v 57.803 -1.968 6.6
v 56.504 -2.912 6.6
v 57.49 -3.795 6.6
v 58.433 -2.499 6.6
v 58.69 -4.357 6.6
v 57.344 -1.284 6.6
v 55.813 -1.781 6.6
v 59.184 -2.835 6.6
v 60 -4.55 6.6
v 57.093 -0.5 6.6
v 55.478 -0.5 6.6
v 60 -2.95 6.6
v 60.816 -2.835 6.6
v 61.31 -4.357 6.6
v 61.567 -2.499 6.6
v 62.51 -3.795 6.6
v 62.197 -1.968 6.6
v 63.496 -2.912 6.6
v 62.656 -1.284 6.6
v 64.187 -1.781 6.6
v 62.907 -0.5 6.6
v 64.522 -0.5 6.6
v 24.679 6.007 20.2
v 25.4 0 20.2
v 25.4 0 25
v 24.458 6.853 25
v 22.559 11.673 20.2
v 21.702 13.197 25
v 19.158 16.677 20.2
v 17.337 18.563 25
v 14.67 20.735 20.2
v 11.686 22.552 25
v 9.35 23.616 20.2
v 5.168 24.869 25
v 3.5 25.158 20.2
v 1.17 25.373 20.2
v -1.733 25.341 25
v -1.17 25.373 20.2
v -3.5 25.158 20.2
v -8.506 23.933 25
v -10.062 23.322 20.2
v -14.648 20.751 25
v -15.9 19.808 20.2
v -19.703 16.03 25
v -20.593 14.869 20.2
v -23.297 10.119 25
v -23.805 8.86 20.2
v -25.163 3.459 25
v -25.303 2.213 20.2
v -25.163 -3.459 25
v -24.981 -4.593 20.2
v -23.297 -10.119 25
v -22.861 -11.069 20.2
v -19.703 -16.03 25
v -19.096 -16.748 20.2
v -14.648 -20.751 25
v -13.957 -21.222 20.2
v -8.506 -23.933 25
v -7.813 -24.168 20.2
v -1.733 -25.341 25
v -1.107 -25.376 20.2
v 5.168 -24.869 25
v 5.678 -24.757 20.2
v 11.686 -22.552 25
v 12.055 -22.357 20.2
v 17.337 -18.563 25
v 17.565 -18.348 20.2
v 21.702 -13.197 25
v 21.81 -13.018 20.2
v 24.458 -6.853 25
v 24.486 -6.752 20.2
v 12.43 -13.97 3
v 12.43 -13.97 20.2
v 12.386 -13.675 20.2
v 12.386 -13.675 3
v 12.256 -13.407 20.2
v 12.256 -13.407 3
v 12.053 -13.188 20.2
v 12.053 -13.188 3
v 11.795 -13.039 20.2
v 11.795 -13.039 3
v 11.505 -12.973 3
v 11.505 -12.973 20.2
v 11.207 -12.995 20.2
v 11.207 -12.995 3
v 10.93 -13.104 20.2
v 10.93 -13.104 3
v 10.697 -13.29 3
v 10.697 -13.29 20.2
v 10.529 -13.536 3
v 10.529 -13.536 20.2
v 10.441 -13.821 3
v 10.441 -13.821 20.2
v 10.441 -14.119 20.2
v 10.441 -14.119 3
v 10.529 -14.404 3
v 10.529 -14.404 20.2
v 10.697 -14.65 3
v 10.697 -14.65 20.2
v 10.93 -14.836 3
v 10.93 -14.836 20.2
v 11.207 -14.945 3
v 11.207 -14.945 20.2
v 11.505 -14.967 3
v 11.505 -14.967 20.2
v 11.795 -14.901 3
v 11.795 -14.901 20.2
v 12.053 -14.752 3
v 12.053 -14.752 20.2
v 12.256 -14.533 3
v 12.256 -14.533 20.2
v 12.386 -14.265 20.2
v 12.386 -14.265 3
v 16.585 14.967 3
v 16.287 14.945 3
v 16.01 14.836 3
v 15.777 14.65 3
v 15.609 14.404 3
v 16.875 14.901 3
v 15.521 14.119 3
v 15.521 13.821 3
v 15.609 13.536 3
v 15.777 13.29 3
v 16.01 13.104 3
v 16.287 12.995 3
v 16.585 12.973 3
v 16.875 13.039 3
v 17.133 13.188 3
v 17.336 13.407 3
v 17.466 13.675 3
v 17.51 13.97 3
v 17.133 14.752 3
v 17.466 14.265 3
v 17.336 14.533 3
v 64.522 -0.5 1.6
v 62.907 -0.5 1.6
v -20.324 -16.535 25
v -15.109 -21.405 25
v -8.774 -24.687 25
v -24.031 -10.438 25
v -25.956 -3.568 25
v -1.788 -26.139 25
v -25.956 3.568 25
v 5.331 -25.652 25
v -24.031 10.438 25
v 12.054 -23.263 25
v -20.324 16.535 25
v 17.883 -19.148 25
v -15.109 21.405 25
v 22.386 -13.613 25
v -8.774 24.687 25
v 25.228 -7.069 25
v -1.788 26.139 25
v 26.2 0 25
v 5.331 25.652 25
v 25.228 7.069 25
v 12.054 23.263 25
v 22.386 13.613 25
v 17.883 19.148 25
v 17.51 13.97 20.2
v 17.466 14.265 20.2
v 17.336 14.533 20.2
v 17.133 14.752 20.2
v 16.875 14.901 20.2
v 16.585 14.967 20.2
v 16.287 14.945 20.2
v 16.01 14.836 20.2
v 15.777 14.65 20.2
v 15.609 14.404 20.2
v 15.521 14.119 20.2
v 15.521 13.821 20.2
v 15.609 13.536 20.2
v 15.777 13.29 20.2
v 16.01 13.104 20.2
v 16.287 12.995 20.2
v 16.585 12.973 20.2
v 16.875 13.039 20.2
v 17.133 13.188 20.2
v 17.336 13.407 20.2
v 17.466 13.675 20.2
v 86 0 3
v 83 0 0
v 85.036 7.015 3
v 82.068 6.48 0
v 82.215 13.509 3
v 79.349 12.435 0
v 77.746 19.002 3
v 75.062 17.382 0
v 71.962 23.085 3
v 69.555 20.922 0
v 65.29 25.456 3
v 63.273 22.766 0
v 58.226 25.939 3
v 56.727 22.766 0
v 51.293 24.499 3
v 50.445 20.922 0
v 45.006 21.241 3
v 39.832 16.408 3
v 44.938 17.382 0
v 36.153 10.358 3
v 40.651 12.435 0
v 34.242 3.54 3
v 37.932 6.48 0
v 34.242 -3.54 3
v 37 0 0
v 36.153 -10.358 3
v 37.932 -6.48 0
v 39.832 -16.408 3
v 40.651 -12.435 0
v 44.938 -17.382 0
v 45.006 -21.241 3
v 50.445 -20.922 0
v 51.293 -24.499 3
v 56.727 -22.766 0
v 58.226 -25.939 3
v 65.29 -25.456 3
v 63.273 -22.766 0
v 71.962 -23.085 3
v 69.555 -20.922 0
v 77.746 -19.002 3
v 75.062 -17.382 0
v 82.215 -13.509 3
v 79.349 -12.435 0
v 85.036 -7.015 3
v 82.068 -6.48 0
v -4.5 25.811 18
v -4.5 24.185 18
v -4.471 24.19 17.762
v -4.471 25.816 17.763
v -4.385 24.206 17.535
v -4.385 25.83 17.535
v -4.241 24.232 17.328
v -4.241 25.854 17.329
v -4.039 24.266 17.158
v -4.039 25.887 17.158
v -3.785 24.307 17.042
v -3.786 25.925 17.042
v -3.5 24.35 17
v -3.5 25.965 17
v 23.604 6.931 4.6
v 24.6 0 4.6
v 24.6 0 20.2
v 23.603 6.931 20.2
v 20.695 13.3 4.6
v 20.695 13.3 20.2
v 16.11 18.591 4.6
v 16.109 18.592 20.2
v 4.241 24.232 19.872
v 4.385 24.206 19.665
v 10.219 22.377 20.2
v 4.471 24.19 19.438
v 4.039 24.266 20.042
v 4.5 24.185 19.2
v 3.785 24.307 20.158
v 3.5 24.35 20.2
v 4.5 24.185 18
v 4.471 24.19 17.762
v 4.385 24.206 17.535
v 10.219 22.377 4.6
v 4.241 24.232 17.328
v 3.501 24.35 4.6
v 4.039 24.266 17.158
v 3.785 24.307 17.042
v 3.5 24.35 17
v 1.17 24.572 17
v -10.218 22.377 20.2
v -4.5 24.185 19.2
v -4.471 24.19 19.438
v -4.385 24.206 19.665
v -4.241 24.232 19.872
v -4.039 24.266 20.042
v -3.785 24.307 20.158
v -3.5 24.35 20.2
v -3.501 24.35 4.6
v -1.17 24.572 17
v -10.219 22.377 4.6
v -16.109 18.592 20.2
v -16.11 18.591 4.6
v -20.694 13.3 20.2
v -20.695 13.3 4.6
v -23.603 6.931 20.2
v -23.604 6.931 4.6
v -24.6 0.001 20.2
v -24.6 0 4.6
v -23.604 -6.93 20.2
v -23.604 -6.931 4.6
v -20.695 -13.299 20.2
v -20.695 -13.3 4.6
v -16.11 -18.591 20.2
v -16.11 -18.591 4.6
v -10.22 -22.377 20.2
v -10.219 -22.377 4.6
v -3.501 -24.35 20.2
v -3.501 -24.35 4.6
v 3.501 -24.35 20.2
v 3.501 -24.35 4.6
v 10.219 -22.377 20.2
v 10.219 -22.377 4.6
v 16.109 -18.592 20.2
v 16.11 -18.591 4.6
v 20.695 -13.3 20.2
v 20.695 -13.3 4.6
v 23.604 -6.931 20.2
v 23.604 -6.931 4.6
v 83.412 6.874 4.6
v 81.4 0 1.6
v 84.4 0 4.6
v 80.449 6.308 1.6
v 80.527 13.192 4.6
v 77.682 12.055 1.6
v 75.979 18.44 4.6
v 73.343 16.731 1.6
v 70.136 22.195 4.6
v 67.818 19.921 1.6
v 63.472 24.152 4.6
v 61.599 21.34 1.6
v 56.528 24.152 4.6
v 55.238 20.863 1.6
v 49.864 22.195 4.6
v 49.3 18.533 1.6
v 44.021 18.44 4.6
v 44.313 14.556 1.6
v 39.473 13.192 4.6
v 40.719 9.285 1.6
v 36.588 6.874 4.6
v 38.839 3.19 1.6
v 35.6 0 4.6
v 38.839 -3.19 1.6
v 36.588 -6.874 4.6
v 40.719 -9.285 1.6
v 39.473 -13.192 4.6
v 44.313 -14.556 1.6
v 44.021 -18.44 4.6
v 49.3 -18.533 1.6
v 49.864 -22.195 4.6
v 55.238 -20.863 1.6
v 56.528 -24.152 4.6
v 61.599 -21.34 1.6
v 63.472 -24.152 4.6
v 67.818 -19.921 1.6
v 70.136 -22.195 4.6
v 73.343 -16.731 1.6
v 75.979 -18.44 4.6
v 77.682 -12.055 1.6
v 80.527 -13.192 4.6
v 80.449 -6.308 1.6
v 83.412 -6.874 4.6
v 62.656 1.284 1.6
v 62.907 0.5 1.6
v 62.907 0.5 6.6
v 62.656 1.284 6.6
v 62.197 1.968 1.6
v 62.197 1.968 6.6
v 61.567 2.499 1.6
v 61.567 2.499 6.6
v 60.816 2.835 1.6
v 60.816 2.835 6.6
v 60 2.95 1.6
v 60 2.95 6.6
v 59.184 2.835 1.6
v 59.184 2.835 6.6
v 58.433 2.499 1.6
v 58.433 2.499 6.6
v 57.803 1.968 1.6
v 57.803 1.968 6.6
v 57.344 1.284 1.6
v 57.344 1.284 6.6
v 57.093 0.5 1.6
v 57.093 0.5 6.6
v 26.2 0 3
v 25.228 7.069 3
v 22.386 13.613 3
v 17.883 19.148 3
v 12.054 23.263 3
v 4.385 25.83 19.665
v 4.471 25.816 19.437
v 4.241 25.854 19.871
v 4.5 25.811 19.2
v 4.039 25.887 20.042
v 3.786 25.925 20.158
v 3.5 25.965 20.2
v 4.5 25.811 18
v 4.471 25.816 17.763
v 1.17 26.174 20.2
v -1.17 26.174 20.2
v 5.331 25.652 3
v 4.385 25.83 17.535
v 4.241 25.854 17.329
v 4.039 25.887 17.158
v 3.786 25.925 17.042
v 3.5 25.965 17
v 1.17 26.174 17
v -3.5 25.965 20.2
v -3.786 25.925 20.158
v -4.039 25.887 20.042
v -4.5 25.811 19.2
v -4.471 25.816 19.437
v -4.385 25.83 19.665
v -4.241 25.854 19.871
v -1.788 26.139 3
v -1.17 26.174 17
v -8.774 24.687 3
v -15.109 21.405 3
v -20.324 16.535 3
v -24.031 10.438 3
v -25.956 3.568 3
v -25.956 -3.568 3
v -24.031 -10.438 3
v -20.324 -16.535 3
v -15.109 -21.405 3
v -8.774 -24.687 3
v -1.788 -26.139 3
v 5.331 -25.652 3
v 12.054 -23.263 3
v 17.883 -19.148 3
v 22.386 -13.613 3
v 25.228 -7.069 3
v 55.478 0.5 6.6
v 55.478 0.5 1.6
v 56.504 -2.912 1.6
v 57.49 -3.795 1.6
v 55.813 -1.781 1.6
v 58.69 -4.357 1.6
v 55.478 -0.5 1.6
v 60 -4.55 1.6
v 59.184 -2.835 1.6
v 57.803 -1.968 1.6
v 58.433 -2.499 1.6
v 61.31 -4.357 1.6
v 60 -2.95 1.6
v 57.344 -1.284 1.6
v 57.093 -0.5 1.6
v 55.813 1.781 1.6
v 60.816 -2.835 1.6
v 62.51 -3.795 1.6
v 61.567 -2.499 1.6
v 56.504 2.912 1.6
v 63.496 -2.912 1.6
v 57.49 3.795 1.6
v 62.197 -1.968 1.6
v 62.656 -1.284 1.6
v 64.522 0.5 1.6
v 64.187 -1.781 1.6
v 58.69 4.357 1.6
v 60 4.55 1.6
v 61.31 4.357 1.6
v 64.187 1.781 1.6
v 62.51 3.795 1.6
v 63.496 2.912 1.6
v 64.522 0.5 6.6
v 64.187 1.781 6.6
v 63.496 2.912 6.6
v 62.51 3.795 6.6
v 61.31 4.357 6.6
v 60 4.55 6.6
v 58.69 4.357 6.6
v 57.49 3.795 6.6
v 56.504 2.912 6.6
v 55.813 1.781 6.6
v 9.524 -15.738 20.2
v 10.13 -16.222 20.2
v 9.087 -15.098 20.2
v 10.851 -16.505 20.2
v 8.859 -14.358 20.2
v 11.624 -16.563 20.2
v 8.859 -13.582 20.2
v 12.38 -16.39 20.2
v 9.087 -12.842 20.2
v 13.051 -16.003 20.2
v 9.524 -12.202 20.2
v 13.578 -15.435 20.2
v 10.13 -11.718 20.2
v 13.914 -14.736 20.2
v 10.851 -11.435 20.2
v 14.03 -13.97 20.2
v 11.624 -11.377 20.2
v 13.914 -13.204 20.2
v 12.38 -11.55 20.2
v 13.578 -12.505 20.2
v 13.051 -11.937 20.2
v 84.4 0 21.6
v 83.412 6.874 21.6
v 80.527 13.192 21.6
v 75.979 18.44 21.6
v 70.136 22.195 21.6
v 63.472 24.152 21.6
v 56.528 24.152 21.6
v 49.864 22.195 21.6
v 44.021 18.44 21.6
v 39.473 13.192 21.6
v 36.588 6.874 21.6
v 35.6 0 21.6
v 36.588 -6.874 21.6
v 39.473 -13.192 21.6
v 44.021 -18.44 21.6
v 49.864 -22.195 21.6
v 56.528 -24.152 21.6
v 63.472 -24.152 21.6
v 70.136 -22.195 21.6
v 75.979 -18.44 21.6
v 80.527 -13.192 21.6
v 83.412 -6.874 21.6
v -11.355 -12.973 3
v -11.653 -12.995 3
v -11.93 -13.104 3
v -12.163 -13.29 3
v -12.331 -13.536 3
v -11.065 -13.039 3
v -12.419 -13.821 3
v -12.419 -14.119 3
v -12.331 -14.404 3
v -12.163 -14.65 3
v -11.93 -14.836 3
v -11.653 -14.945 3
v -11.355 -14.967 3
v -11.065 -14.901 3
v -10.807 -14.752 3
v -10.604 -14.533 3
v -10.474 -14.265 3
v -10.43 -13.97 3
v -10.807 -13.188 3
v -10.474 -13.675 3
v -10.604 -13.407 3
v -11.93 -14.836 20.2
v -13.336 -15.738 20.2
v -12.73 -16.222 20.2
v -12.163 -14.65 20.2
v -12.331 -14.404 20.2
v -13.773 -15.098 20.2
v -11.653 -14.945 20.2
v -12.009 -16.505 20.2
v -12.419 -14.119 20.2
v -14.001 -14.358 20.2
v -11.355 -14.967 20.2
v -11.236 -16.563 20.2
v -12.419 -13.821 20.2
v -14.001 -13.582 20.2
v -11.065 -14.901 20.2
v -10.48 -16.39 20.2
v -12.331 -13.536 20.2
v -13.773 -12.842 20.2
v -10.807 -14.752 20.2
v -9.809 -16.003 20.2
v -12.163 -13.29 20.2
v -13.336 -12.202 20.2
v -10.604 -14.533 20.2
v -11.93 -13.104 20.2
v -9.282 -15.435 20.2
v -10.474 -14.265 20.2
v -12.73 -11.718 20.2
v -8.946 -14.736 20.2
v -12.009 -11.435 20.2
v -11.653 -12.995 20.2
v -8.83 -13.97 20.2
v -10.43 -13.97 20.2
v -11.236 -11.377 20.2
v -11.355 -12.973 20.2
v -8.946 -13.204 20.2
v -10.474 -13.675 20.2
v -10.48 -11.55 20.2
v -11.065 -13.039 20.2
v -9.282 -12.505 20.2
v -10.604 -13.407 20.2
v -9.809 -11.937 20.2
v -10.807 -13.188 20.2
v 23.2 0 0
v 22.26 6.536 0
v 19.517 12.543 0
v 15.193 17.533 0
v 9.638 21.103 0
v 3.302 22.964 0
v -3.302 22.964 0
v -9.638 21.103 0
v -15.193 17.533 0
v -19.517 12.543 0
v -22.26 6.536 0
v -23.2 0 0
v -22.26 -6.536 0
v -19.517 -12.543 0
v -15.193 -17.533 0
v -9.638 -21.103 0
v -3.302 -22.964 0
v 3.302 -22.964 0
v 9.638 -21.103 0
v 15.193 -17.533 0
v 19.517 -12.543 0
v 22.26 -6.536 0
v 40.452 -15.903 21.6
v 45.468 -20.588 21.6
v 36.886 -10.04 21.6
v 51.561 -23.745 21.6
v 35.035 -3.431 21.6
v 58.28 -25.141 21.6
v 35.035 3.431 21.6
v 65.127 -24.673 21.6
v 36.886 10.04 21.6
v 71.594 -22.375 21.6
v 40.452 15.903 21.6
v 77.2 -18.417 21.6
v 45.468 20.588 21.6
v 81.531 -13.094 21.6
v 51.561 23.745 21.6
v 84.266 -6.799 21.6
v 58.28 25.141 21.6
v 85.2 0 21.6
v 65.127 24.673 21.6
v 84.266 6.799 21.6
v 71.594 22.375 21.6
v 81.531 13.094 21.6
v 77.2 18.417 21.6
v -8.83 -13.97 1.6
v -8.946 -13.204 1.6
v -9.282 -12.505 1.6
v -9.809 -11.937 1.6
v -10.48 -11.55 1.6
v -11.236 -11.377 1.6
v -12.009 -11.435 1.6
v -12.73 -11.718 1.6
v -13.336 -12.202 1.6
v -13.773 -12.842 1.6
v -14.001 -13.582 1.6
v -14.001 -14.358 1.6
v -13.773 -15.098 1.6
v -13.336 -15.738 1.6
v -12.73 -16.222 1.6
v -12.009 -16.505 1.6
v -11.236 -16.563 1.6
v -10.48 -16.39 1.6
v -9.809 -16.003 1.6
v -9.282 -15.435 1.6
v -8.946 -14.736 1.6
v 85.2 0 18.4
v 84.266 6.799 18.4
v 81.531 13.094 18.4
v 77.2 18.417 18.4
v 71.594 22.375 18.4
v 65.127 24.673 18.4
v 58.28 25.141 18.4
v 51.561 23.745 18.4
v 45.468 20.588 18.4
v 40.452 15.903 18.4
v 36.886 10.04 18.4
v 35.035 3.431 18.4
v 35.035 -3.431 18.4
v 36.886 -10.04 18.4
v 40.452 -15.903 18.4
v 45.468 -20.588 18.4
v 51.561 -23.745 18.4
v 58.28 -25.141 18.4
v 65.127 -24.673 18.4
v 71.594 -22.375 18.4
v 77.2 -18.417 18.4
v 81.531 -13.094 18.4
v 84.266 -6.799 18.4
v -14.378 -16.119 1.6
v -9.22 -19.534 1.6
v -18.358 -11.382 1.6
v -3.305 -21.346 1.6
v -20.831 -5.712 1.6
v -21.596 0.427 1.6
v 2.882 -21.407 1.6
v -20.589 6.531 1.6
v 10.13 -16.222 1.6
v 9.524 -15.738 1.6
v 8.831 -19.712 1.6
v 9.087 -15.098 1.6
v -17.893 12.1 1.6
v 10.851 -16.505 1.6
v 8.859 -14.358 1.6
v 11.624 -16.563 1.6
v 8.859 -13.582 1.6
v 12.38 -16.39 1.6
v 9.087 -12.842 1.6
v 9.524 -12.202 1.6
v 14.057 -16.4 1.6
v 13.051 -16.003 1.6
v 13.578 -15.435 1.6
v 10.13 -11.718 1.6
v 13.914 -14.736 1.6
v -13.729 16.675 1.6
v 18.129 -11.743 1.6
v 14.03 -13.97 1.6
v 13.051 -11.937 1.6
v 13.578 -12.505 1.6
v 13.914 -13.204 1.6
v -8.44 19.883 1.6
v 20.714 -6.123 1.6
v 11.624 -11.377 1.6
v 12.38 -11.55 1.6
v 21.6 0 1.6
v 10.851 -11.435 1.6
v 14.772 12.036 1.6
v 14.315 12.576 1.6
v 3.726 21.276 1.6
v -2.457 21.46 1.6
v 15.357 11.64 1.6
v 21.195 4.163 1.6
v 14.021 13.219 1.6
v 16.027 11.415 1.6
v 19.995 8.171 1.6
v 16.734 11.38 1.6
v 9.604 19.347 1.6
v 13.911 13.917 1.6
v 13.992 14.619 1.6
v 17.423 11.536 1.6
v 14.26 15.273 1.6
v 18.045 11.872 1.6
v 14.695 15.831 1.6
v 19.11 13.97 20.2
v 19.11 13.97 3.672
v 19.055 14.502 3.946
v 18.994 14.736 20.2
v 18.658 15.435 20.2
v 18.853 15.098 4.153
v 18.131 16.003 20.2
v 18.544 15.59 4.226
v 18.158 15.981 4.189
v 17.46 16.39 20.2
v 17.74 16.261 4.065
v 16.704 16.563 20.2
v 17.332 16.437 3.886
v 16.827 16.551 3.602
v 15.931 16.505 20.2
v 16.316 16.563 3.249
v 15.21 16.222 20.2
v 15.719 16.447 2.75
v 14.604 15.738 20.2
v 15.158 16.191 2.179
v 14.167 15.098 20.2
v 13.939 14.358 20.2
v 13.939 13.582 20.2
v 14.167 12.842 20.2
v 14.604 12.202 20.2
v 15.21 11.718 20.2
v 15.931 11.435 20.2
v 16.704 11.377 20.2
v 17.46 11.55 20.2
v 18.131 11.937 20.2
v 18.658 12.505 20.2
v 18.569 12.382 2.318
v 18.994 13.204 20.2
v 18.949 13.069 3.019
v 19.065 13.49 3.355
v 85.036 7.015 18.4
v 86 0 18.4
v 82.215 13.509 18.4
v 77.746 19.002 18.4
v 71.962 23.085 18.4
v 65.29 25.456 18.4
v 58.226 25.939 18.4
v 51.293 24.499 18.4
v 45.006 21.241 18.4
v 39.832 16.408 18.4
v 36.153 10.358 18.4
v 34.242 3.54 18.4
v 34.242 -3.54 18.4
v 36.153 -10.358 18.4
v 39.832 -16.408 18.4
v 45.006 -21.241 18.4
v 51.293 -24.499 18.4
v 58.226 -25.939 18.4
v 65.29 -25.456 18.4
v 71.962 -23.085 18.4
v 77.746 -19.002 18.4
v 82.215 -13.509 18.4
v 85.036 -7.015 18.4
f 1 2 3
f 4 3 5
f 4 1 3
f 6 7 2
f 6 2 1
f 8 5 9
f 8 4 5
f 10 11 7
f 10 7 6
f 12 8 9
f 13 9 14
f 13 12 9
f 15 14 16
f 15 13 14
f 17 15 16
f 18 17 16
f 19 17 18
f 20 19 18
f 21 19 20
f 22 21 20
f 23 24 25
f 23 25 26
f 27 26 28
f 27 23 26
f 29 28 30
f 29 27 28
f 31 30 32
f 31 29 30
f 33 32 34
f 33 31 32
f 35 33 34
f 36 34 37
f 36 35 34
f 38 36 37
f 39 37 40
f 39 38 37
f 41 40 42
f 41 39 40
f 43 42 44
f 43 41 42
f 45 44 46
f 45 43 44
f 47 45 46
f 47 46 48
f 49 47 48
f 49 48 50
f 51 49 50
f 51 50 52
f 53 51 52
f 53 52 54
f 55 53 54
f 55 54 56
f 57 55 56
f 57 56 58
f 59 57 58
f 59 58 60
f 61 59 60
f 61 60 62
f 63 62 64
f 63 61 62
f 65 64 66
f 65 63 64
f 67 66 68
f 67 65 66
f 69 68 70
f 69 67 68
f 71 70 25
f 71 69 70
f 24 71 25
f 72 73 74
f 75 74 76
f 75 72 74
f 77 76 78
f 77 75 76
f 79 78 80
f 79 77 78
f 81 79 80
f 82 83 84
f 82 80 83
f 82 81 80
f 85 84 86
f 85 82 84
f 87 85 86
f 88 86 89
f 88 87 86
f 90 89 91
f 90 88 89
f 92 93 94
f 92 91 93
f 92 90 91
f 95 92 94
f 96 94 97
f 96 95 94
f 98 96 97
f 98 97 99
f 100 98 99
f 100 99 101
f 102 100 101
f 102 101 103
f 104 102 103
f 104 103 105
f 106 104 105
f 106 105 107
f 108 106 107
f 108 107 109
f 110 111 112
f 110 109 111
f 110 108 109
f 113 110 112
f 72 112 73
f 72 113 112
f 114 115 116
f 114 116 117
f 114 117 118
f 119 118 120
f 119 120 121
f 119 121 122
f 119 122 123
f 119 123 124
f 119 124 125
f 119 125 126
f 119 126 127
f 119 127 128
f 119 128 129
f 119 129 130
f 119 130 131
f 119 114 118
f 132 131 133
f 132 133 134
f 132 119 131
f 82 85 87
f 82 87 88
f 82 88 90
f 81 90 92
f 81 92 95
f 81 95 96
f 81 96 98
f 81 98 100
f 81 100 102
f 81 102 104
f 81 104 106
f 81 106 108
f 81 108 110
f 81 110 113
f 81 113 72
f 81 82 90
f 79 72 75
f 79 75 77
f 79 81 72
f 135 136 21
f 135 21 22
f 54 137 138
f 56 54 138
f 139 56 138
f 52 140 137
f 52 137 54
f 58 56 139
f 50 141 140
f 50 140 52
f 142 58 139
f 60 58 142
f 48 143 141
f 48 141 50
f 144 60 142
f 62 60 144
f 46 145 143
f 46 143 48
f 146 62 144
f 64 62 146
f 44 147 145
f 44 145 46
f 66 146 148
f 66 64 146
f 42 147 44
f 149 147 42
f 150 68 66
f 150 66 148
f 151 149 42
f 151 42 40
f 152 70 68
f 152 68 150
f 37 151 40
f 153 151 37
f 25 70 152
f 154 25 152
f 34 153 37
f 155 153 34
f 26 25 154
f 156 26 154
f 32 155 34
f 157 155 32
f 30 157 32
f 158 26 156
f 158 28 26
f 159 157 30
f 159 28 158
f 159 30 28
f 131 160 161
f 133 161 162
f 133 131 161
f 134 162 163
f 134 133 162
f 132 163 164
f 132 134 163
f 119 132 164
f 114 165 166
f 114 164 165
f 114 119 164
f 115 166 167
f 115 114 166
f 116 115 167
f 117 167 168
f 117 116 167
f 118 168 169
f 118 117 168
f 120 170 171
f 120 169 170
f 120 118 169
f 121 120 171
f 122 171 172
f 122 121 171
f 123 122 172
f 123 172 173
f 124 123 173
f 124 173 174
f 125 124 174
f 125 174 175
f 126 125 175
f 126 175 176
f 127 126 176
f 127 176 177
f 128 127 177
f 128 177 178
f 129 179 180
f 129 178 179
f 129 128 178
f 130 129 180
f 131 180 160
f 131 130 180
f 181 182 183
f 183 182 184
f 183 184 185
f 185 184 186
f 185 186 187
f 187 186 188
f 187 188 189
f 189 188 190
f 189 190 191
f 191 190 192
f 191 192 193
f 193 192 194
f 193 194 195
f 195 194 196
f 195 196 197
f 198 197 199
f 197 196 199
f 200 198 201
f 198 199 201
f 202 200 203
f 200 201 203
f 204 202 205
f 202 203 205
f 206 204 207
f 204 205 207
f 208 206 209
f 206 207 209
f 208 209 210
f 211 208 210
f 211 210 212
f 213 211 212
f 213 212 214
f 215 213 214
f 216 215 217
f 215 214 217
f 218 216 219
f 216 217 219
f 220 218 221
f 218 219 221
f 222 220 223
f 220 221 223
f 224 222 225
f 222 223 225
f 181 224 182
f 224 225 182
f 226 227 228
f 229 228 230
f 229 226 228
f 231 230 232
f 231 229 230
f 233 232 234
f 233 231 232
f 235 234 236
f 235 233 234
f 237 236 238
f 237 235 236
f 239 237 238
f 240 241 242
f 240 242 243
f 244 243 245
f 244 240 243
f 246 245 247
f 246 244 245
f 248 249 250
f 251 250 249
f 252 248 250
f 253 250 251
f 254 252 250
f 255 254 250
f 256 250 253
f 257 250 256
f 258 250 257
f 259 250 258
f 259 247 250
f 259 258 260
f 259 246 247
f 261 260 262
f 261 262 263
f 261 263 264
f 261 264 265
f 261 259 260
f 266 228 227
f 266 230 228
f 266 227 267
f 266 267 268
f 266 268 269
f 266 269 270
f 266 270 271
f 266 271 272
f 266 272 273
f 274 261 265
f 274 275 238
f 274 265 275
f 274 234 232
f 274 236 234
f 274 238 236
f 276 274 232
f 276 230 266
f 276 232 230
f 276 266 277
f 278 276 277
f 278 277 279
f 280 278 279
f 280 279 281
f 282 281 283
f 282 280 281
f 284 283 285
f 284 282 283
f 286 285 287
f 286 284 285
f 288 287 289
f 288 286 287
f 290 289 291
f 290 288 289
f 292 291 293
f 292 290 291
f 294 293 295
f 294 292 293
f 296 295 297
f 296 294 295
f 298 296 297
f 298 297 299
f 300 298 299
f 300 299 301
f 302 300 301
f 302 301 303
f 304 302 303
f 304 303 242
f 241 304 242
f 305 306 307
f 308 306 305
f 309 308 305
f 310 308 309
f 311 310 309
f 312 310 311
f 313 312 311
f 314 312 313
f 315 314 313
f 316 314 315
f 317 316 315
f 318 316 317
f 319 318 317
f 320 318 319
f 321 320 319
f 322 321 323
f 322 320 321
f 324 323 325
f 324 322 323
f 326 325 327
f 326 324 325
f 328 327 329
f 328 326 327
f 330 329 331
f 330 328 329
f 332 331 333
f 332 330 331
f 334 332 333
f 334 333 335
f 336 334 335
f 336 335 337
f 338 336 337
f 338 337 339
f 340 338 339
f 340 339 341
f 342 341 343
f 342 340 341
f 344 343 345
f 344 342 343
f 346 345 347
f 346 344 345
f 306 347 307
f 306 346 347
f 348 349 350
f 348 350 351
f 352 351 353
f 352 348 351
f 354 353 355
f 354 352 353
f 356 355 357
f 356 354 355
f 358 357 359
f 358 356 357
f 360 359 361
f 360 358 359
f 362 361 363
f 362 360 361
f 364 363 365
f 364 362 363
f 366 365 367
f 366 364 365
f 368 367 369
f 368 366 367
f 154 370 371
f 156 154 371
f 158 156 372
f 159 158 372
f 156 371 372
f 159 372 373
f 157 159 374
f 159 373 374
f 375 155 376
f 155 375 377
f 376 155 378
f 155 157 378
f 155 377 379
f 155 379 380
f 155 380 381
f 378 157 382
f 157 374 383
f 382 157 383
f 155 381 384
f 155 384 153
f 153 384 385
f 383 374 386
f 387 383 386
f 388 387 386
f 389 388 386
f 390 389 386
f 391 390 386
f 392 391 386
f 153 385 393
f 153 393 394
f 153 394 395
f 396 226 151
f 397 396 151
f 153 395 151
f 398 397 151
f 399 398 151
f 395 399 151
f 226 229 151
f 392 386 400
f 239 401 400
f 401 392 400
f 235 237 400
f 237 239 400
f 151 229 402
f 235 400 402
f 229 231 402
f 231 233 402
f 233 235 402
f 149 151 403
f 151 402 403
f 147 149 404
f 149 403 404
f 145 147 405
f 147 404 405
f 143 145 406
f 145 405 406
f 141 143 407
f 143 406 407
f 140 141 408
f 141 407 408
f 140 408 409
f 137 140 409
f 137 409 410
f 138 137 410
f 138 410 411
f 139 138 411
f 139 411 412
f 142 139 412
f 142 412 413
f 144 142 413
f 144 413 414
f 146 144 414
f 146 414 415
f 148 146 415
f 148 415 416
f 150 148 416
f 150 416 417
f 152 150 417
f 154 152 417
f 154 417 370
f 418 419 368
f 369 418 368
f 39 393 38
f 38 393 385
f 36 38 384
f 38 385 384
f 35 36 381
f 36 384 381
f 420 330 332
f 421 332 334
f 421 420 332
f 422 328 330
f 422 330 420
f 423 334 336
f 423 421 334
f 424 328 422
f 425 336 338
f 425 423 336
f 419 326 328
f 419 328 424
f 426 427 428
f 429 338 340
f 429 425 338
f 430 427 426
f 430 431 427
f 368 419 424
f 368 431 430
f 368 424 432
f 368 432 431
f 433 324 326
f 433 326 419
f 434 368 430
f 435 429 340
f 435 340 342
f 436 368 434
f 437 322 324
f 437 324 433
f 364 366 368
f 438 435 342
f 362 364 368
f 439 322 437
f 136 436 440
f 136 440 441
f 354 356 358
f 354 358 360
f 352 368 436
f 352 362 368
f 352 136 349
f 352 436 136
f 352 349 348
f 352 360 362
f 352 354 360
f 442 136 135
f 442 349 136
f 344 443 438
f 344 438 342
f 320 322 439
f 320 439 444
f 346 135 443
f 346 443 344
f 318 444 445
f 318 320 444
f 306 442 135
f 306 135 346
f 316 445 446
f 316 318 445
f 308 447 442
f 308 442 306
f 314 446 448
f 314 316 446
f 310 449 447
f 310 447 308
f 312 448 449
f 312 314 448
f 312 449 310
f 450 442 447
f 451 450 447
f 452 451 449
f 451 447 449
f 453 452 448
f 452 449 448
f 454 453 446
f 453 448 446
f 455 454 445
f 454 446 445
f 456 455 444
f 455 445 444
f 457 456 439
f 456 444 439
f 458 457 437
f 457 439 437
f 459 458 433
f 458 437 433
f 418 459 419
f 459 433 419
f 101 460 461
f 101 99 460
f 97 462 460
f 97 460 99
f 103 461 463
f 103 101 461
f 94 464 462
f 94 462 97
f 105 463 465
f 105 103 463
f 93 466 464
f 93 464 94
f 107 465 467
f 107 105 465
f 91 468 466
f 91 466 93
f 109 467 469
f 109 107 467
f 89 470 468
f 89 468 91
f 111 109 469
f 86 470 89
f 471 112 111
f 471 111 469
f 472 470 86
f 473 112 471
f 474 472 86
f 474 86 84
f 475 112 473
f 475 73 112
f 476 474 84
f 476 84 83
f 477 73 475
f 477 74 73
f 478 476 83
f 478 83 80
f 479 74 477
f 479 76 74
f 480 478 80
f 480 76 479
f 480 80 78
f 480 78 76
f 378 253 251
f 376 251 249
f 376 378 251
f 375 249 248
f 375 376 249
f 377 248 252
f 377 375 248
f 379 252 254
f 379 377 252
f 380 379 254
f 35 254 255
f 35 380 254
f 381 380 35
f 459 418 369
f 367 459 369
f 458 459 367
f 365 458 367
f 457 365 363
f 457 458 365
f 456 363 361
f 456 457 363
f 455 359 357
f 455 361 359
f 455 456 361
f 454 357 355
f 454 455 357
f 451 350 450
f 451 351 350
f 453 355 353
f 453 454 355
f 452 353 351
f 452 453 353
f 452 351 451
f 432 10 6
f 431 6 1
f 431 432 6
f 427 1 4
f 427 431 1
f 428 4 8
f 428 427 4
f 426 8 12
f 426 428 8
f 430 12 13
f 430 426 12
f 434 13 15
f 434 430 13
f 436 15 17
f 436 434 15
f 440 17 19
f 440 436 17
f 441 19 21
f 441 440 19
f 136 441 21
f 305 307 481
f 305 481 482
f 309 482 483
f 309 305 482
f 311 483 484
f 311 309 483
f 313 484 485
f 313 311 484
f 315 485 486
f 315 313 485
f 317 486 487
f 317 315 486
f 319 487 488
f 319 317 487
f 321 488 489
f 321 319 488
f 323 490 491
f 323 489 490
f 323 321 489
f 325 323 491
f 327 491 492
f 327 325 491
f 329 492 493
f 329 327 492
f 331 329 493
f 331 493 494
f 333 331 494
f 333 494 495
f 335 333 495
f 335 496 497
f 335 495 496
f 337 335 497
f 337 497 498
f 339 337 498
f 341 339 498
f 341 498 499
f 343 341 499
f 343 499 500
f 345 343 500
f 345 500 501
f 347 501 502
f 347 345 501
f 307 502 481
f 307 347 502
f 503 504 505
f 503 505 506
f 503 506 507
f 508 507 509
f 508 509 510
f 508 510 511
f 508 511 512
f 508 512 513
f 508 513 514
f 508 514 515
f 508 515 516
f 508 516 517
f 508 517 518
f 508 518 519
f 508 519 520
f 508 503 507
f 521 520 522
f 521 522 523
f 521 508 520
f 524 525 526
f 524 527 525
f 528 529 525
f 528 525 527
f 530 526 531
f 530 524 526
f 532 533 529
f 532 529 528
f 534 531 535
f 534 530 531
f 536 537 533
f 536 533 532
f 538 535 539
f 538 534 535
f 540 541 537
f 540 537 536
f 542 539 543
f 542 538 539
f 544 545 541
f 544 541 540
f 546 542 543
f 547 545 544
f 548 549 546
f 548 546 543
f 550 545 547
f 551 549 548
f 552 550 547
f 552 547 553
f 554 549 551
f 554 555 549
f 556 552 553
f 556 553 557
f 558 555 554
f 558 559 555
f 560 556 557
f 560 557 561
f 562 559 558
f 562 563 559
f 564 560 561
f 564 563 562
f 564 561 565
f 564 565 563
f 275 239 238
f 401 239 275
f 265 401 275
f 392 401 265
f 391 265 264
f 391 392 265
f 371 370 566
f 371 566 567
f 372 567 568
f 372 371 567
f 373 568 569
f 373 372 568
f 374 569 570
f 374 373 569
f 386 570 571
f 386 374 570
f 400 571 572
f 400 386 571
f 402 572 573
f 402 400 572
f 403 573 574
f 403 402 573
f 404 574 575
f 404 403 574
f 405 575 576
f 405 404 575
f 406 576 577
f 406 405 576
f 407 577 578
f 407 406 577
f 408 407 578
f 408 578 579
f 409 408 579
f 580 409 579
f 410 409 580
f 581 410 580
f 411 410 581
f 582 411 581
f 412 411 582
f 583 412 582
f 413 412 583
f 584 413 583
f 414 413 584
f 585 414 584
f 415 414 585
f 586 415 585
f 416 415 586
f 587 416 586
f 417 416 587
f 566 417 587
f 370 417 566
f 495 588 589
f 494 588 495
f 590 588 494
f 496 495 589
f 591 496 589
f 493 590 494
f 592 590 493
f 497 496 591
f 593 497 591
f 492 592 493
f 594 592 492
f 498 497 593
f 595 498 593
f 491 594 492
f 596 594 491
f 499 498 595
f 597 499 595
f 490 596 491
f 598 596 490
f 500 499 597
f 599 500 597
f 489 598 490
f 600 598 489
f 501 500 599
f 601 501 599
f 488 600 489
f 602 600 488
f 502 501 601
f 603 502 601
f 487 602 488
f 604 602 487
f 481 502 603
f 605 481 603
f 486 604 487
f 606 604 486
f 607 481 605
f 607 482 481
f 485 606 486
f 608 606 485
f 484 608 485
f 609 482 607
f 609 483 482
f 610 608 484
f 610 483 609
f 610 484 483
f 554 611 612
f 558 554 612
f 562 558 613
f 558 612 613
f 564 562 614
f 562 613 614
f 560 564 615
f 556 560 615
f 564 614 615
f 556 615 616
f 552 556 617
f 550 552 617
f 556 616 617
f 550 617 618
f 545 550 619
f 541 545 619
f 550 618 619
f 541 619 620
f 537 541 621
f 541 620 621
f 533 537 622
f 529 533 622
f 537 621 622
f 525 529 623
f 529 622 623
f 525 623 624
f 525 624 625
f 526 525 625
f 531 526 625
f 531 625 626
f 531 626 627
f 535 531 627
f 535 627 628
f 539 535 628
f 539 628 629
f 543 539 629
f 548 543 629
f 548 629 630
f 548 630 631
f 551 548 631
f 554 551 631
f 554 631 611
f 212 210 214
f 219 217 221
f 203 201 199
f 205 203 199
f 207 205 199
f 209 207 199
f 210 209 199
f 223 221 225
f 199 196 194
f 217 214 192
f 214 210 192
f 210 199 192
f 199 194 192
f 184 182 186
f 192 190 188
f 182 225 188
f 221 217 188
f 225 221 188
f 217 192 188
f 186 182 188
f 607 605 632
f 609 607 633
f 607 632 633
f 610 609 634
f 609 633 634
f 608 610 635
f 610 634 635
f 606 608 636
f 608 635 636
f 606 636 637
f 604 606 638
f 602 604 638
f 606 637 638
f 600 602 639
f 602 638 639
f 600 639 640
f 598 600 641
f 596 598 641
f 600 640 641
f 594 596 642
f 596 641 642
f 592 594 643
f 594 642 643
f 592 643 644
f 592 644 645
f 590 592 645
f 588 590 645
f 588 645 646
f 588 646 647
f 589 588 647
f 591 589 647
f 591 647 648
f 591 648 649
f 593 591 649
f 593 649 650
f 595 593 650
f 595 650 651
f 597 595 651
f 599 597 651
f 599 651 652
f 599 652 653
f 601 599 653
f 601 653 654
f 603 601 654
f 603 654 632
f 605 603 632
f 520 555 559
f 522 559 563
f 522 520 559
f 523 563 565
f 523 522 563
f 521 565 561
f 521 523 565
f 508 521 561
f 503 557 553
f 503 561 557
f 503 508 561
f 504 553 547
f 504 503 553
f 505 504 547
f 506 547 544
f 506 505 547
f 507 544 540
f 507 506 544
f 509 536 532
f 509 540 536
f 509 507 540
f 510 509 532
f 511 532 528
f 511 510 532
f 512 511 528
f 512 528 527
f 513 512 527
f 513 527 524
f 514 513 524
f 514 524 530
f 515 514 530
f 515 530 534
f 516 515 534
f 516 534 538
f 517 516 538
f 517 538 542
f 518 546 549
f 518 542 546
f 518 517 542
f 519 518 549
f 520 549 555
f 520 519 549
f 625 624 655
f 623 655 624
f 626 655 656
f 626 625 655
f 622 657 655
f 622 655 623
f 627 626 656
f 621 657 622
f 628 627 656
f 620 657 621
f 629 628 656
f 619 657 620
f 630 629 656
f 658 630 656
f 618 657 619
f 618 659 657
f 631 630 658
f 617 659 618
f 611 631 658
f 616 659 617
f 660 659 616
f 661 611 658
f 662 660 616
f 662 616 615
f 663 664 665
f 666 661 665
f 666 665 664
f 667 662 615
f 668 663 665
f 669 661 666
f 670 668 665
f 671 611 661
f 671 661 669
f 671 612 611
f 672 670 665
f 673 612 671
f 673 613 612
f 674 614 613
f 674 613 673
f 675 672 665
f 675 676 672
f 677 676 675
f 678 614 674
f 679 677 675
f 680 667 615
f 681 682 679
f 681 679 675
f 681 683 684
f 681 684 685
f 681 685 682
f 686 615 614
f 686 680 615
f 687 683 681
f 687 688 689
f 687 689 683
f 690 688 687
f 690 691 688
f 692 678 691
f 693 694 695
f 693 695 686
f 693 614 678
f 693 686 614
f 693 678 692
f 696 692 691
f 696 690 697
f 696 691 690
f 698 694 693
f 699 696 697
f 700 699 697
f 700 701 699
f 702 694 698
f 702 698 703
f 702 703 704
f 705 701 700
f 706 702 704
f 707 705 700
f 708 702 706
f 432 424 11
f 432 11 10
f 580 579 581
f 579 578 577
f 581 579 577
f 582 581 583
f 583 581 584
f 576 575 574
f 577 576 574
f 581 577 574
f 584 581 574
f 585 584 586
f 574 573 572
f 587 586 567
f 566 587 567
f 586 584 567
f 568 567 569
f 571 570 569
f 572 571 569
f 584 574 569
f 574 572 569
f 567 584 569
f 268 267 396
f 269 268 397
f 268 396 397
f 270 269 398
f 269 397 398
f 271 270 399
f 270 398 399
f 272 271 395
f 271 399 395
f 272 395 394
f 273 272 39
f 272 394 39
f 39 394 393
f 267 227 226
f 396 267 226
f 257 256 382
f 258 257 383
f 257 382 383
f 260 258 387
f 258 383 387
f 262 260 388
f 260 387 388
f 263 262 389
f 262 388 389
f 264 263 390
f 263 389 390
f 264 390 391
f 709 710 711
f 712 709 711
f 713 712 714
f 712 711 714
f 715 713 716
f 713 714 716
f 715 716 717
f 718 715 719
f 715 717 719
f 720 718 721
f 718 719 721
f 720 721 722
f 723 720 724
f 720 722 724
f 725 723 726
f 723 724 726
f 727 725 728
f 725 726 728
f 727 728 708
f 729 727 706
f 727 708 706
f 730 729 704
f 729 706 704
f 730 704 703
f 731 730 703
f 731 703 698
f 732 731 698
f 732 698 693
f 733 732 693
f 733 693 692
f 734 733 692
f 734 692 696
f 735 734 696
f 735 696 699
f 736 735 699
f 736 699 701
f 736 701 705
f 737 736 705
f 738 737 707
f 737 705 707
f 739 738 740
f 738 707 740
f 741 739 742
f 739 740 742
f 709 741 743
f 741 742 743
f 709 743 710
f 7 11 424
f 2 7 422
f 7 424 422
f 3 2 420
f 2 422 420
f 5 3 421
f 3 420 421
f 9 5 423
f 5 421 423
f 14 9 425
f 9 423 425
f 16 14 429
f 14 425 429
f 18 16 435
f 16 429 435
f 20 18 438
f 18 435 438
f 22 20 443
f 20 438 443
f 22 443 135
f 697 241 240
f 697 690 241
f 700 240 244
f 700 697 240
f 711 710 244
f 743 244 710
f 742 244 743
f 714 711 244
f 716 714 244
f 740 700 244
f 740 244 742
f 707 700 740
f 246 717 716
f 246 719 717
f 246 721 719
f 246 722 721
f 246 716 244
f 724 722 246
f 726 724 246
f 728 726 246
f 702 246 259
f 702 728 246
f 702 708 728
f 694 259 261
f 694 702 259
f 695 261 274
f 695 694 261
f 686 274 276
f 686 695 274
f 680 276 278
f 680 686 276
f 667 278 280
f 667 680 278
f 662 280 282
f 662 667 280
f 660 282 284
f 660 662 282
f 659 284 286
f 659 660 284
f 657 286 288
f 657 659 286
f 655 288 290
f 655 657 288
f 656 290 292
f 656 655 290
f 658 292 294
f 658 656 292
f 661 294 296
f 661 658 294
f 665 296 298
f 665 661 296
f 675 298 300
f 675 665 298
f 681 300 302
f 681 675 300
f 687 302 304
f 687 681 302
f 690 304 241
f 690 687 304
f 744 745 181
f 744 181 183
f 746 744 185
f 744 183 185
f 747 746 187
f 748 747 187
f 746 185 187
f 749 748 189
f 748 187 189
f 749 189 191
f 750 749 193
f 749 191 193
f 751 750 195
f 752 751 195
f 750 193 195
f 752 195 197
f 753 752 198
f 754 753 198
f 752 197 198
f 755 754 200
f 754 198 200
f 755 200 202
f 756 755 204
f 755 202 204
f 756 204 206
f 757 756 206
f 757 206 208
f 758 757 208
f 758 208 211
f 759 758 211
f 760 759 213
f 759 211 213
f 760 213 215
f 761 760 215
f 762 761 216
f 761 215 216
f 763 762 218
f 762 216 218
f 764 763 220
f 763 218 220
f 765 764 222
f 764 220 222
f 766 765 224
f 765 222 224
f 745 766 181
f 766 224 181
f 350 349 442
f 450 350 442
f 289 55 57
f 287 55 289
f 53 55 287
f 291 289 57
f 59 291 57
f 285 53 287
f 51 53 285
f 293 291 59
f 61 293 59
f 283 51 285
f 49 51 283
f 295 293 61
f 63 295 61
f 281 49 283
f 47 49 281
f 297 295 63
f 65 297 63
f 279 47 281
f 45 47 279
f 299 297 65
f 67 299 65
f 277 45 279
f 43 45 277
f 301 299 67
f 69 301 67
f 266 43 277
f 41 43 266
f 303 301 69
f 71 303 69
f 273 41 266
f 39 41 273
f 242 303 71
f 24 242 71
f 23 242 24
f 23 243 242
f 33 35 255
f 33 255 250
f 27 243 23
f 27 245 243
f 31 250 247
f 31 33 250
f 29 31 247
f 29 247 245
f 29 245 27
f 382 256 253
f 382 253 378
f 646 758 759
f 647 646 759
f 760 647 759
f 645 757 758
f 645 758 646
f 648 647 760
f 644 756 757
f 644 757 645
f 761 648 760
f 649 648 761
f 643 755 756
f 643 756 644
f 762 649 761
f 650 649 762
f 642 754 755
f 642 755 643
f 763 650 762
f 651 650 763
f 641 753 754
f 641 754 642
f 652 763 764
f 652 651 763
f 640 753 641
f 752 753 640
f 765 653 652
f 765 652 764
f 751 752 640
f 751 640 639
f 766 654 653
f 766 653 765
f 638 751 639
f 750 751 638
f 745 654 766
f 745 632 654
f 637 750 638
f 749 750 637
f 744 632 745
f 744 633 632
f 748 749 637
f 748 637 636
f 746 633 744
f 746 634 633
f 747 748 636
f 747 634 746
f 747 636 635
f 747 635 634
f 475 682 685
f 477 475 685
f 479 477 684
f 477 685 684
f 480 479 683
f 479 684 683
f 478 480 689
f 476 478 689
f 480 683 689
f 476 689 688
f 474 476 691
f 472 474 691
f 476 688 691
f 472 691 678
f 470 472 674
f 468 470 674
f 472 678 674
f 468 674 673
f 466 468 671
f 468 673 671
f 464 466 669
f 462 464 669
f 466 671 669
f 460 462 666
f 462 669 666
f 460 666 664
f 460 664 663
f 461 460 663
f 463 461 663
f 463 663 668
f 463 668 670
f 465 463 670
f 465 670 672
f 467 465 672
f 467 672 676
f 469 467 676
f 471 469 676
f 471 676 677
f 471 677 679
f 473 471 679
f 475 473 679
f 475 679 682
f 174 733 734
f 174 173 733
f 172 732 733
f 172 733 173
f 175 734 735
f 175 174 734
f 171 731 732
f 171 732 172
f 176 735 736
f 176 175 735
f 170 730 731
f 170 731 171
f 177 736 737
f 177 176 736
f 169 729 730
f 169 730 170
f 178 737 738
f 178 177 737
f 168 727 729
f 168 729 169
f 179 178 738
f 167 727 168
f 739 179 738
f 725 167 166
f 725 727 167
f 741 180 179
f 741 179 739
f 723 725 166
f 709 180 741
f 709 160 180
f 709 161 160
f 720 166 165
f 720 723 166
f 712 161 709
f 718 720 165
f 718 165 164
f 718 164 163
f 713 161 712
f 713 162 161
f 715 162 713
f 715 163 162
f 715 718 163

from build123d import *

# Parameters (mm, degrees)
BOX_W             = 9
BOX_H             = 10
BOX_DEPTH         = 3.2
FILLET_R          = 1
CYLINDER007_R     = 1
CYLINDER007_DEPTH = 20.2
CYLINDER004_R     = 2.6
CYLINDER004_DEPTH = 20.2
CYLINDER006_R     = 1
CYLINDER006_DEPTH = 20.2
CYLINDER003_R     = 2.6
CYLINDER003_DEPTH = 20.2
CYLINDER008_R     = 1
CYLINDER008_DEPTH = 20.2
CYLINDER005_R     = 2.6
CYLINDER005_DEPTH = 20.2
CYLINDER002_R     = 25.4
CYLINDER002_DEPTH = 25
CYLINDER001_R     = 24.6
CYLINDER001_DEPTH = 25
CYLINDER_R        = 26.2
CYLINDER_DEPTH    = 25
CHAMFER_SIZE      = 3
CHAMFER001_SIZE   = 3
BOX001_W          = 10
BOX001_H          = 1
BOX001_DEPTH      = 10
CYLINDER013_R     = 2.95
CYLINDER013_DEPTH = 5
CYLINDER012_R     = 4.55
CYLINDER012_DEPTH = 5
CYLINDER011_R     = 24.4
CYLINDER011_DEPTH = 21.6
CYLINDER010_R     = 25.2
CYLINDER010_DEPTH = 21.6
CYLINDER009_R     = 26
CYLINDER009_DEPTH = 18.4
CHAMFER002_SIZE   = 3
CHAMFER003_SIZE   = 3


with BuildPart() as usb:
    # Box → Box (new body)
    with BuildSketch(Plane(origin=(-4.5, 18, 17), x_dir=(1, 0, 0), z_dir=(0, 0, 1))):
        with Locations((4.5, 5)):
            Rectangle(BOX_W, BOX_H)
    extrude(amount=BOX_DEPTH)

    # Fillet
    fillet_edges = [usb.edges().sort_by_distance(p)[0] for p in [
        (-4.5, 23, 20.2),
        (-4.5, 23, 17),
        (4.5, 23, 20.2),
        (4.5, 23, 17),
    ]]
    fillet(fillet_edges, radius=FILLET_R)


with BuildPart() as zylinder007:
    # Cylinder007 → Cylinder007 (new body)
    with BuildSketch(Plane(origin=(-11.43, -13.97, 3), x_dir=(1, 0, 0), z_dir=(0, 0, 1))):
        Circle(CYLINDER007_R)
    extrude(amount=CYLINDER007_DEPTH)


with BuildPart() as cut003:
    # Cylinder004 → Cylinder004 (new body)
    with BuildSketch(Plane(origin=(-11.43, -13.97, 0), x_dir=(1, 0, 0), z_dir=(0, 0, 1))):
        Circle(CYLINDER004_R)
    extrude(amount=CYLINDER004_DEPTH)

    # Cut003: cut Zylinder007
    add(zylinder007.part, mode=Mode.SUBTRACT)


with BuildPart() as zylinder006:
    # Cylinder006 → Cylinder006 (new body)
    with BuildSketch(Plane(origin=(16.51, 13.97, 3), x_dir=(1, 0, 0), z_dir=(0, 0, 1))):
        Circle(CYLINDER006_R)
    extrude(amount=CYLINDER006_DEPTH)


with BuildPart() as cut002:
    # Cylinder003 → Cylinder003 (new body)
    with BuildSketch(Plane(origin=(16.51, 13.97, 0), x_dir=(1, 0, 0), z_dir=(0, 0, 1))):
        Circle(CYLINDER003_R)
    extrude(amount=CYLINDER003_DEPTH)

    # Cut002: cut Zylinder006
    add(zylinder006.part, mode=Mode.SUBTRACT)


with BuildPart() as zylinder008:
    # Cylinder008 → Cylinder008 (new body)
    with BuildSketch(Plane(origin=(11.43, -13.97, 3), x_dir=(1, 0, 0), z_dir=(0, 0, 1))):
        Circle(CYLINDER008_R)
    extrude(amount=CYLINDER008_DEPTH)


with BuildPart() as cut004:
    # Cylinder005 → Cylinder005 (new body)
    with BuildSketch(Plane(origin=(11.43, -13.97, 0), x_dir=(1, 0, 0), z_dir=(0, 0, 1))):
        Circle(CYLINDER005_R)
    extrude(amount=CYLINDER005_DEPTH)

    # Cut004: cut Zylinder008
    add(zylinder008.part, mode=Mode.SUBTRACT)


with BuildPart() as zylinder002:
    # Cylinder002 → Cylinder002 (new body)
    with BuildSketch(Plane.XY.offset(20.2)):
        Circle(CYLINDER002_R)
    extrude(amount=CYLINDER002_DEPTH)


with BuildPart() as zylinder001:
    # Cylinder001 → Cylinder001 (new body)
    with BuildSketch(Plane.XY.offset(1.6)):
        Circle(CYLINDER001_R)
    extrude(amount=CYLINDER001_DEPTH)


with BuildPart() as bottom:
    # Cylinder → Cylinder (new body)
    with BuildSketch(Plane.XY):
        Circle(CYLINDER_R)
    extrude(amount=CYLINDER_DEPTH)

    # Cut: cut Zylinder001
    add(zylinder001.part, mode=Mode.SUBTRACT)

    # Cut001: cut Zylinder002
    add(zylinder002.part, mode=Mode.SUBTRACT)

    # Chamfer
    chamfer_edges = [bottom.edges().sort_by_distance(p)[0] for p in [
        (-24.6, 0, 1.6),
    ]]
    chamfer(chamfer_edges, length=CHAMFER_SIZE)

    # Fusion: union Cut003, Cut002, Cut004
    add(cut003.part)
    add(cut002.part)
    add(cut004.part)

    # Chamfer001
    chamfer001_edges = [bottom.edges().sort_by_distance(p)[0] for p in [
        (-26.2, 0, 0),
    ]]
    chamfer(chamfer001_edges, length=CHAMFER001_SIZE)

    # Cut005: cut USB
    add(usb.part, mode=Mode.SUBTRACT)


with BuildPart() as w_rfel001:
    # Box001 → Box001 (new body)
    with BuildSketch(Plane(origin=(55, -0.5, 1.6), x_dir=(1, 0, 0), z_dir=(0, 0, 1))):
        with Locations((5, 0.5)):
            Rectangle(BOX001_W, BOX001_H)
    extrude(amount=BOX001_DEPTH)


with BuildPart() as zylinder013:
    # Cylinder013 → Cylinder013 (new body)
    with BuildSketch(Plane(origin=(60, 0, 1.6), x_dir=(1, 0, 0), z_dir=(0, 0, 1))):
        Circle(CYLINDER013_R)
    extrude(amount=CYLINDER013_DEPTH)


with BuildPart() as cut008:
    # Cylinder012 → Cylinder012 (new body)
    with BuildSketch(Plane(origin=(60, 0, 1.6), x_dir=(1, 0, 0), z_dir=(0, 0, 1))):
        Circle(CYLINDER012_R)
    extrude(amount=CYLINDER012_DEPTH)

    # Cut007: cut Zylinder013
    add(zylinder013.part, mode=Mode.SUBTRACT)

    # Cut008: cut Würfel001
    add(w_rfel001.part, mode=Mode.SUBTRACT)


with BuildPart() as zylinder011:
    # Cylinder011 → Cylinder011 (new body)
    with BuildSketch(Plane(origin=(60, 0, 1.6), x_dir=(1, 0, 0), z_dir=(0, 0, 1))):
        Circle(CYLINDER011_R)
    extrude(amount=CYLINDER011_DEPTH)


with BuildPart() as zylinder010:
    # Cylinder010 → Cylinder010 (new body)
    with BuildSketch(Plane(origin=(60, 0, 0), x_dir=(1, 0, 0), z_dir=(0, 0, 1))):
        Circle(CYLINDER010_R)
    extrude(amount=CYLINDER010_DEPTH)


with BuildPart() as top:
    # Cylinder009 → Cylinder009 (new body)
    with BuildSketch(Plane(origin=(60, 0, 0), x_dir=(1, 0, 0), z_dir=(0, 0, 1))):
        Circle(CYLINDER009_R)
    extrude(amount=CYLINDER009_DEPTH)

    # Fusion001: union Zylinder010
    add(zylinder010.part)

    # Cut006: cut Zylinder011
    add(zylinder011.part, mode=Mode.SUBTRACT)

    # Chamfer002
    chamfer002_edges = [top.edges().sort_by_distance(p)[0] for p in [
        (35.6, 0, 1.6),
    ]]
    chamfer(chamfer002_edges, length=CHAMFER002_SIZE)

    # Chamfer003
    chamfer003_edges = [top.edges().sort_by_distance(p)[0] for p in [
        (34, 0, 0),
    ]]
    chamfer(chamfer003_edges, length=CHAMFER003_SIZE)

    # Fusion002: union Cut008
    add(cut008.part)


solid = Compound([bottom.part, top.part])
